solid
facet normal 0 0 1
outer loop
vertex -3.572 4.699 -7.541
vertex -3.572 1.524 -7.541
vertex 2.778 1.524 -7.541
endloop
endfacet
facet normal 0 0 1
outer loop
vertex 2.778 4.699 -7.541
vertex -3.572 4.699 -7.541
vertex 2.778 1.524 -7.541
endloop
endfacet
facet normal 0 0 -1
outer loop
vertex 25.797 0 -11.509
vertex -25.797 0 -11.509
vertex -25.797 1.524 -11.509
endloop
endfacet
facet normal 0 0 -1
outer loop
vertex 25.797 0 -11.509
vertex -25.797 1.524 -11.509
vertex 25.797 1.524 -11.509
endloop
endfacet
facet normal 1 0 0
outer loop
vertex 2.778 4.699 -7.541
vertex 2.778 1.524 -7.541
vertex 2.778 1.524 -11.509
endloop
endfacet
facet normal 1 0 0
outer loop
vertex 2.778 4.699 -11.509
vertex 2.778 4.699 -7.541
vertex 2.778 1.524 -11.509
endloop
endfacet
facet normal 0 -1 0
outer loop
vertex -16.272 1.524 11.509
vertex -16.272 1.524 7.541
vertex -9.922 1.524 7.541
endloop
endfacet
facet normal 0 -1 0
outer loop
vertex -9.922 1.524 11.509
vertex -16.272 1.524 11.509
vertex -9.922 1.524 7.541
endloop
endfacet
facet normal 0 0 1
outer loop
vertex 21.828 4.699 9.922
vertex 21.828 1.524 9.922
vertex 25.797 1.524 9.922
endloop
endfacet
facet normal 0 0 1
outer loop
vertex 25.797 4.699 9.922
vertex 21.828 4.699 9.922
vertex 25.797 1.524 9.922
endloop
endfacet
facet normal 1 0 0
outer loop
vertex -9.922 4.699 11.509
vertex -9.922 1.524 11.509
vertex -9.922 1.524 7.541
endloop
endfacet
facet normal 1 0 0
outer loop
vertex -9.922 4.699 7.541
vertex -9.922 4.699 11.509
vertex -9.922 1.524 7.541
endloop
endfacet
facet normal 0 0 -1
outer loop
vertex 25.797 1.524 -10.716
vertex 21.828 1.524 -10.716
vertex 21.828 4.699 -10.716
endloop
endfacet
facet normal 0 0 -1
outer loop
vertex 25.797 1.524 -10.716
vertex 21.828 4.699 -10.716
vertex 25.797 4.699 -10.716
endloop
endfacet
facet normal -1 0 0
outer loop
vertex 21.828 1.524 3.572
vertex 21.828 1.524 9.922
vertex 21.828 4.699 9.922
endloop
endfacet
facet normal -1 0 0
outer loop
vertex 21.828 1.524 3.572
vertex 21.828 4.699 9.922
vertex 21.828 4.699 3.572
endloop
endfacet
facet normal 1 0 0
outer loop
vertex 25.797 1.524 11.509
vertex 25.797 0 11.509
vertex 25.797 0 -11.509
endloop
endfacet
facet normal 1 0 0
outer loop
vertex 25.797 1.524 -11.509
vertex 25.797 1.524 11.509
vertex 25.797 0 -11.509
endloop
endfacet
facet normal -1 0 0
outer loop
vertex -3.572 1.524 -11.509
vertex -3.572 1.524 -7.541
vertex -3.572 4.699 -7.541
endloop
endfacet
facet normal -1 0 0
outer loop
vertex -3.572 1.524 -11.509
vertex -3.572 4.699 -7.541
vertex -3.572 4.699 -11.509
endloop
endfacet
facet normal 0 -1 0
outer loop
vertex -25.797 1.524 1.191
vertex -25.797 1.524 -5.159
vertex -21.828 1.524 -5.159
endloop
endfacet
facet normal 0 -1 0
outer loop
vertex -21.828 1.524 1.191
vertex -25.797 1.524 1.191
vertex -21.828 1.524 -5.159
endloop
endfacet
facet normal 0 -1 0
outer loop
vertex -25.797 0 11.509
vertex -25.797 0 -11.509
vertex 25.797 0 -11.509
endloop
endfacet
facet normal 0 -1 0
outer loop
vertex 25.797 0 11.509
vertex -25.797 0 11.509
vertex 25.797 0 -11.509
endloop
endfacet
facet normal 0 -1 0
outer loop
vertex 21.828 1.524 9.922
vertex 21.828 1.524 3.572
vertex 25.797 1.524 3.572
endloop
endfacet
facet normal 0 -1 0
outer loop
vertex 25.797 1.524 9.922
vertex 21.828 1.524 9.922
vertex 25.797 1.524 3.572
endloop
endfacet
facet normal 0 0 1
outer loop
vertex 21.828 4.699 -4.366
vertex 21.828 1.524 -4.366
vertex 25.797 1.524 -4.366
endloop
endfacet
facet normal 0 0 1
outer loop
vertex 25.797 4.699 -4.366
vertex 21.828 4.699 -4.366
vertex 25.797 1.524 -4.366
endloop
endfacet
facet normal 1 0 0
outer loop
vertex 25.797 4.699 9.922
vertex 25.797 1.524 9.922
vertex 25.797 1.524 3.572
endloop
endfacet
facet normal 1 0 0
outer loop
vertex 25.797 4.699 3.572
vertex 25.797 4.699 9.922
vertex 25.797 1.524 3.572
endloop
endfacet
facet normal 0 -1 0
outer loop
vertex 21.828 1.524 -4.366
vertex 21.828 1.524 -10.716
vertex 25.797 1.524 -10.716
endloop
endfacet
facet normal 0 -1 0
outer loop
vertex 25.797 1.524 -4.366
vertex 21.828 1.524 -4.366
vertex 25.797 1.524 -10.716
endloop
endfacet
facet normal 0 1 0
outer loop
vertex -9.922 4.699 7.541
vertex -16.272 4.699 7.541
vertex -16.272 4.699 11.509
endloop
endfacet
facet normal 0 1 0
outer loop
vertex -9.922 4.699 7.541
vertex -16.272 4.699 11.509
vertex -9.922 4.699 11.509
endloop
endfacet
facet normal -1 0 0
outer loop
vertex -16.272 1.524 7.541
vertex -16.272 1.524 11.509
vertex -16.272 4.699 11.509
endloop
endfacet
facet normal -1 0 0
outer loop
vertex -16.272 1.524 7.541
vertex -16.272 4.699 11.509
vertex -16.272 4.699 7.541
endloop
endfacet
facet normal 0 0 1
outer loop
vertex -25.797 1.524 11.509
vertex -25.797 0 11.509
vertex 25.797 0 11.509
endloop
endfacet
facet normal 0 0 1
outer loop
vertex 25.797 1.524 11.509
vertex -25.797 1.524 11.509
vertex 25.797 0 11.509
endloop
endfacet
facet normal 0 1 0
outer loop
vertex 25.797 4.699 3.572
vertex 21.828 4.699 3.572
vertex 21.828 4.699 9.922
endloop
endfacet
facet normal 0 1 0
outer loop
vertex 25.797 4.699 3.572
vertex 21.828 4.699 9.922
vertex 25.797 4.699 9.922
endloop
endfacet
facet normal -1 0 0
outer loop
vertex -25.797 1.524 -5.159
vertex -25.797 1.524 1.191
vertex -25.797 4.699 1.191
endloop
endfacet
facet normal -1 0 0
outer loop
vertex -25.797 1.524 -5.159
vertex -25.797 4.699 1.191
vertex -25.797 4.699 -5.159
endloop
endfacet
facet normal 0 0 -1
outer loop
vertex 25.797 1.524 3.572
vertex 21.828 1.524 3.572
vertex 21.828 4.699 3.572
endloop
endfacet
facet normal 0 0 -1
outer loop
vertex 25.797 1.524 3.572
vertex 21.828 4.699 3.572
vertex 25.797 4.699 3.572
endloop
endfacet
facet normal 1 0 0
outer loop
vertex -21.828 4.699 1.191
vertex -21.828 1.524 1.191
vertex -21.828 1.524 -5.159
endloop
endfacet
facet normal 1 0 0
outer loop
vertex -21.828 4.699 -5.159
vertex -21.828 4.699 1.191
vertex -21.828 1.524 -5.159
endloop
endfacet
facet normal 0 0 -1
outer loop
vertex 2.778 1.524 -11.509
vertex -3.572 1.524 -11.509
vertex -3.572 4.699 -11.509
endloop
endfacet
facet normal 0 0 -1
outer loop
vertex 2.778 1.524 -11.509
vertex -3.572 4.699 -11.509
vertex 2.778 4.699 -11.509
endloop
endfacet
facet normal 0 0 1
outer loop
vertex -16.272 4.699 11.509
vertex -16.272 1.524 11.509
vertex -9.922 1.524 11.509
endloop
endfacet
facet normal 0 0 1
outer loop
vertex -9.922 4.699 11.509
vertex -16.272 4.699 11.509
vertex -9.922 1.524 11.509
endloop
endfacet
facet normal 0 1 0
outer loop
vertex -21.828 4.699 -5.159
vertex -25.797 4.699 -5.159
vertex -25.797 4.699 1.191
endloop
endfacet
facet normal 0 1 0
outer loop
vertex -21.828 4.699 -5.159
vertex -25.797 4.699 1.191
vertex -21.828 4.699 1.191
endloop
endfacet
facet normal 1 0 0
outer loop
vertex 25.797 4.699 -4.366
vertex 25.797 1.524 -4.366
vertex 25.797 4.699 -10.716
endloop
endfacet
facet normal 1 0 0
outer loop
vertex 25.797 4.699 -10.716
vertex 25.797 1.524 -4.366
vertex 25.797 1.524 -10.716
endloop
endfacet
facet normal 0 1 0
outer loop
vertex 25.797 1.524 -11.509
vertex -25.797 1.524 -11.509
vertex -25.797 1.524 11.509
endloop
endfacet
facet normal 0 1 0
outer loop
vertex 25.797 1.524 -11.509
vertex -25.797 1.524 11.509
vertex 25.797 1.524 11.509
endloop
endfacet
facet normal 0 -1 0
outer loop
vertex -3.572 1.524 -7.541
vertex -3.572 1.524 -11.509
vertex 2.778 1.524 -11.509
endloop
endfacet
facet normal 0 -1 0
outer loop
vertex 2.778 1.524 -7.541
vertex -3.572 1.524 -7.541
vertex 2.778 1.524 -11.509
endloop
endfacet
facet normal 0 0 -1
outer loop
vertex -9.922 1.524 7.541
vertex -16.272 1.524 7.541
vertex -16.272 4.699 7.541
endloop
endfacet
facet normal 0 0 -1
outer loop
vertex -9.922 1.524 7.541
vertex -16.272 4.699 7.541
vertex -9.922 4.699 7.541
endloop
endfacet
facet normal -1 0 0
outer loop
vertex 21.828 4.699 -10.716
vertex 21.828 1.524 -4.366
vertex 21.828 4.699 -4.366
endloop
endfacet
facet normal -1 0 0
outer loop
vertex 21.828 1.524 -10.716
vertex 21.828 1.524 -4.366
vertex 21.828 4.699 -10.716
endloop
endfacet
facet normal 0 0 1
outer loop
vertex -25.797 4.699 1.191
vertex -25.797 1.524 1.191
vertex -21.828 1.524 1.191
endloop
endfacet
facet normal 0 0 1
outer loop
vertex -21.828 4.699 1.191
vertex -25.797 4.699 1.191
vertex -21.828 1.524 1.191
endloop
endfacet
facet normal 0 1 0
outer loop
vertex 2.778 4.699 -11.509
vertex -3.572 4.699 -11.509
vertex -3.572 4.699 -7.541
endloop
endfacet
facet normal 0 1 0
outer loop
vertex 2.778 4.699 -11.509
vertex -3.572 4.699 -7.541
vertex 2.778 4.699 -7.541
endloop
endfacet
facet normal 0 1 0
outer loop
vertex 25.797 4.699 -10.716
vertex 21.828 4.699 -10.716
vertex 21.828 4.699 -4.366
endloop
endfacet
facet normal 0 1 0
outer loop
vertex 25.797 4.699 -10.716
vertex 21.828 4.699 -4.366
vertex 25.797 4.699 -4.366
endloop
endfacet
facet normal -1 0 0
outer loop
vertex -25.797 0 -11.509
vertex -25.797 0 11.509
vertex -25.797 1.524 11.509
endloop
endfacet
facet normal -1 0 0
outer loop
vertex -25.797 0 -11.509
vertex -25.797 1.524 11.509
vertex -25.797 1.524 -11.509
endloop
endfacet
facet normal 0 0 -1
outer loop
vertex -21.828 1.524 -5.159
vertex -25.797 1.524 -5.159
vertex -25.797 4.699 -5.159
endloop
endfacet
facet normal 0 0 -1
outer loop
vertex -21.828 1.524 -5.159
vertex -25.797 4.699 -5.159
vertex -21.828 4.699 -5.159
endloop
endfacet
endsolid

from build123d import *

# Parameters (mm, degrees)
SKETCH1_W             = 51.59375
SKETCH1_H             = 23.01875
BOSS_EXTRUDE1_DEPTH   = 1.524
SKETCH2_W             = 3.96875
SKETCH2_H             = 6.35
BOSS_EXTRUDE2_DEPTH   = 3.175
BOSS_EXTRUDE2_2_DEPTH = 3.175
SKETCH2_W_2           = 6.35
SKETCH2_H_2           = 3.96875
BOSS_EXTRUDE2_3_DEPTH = 3.175
BOSS_EXTRUDE2_4_DEPTH = 3.175
BOSS_EXTRUDE2_5_DEPTH = 3.175


with BuildPart() as part:
    # Sketch1 → Boss-Extrude1 (new body)
    with BuildSketch(Plane(origin=(0, 0, 0), x_dir=(1, 0, 0), z_dir=(0, 1, 0))):
        Rectangle(SKETCH1_W, SKETCH1_H)
    extrude(amount=BOSS_EXTRUDE1_DEPTH)


with BuildPart() as body_2:
    # Sketch2 → Boss-Extrude2 (new body)
    with BuildSketch(Plane(origin=(0, 1.524, 0), x_dir=(1, 0, 0), z_dir=(0, 1, 0))):
        with Locations((23.8125, -6.746875)):
            Rectangle(SKETCH2_W, SKETCH2_H)
    extrude(amount=BOSS_EXTRUDE2_DEPTH)


with BuildPart() as body_3:
    # Sketch2 → Boss-Extrude2 2 (new body)
    with BuildSketch(Plane(origin=(0, 1.524, 0), x_dir=(1, 0, 0), z_dir=(0, 1, 0))):
        with Locations((23.8125, 7.540625)):
            Rectangle(SKETCH2_W, SKETCH2_H)
    extrude(amount=BOSS_EXTRUDE2_2_DEPTH)


with BuildPart() as body_4:
    # Sketch2 → Boss-Extrude2 3 (new body)
    with BuildSketch(Plane(origin=(0, 1.524, 0), x_dir=(1, 0, 0), z_dir=(0, 1, 0))):
        with Locations((-0.396875, 9.525)):
            Rectangle(SKETCH2_W_2, SKETCH2_H_2)
    extrude(amount=BOSS_EXTRUDE2_3_DEPTH)


with BuildPart() as body_5:
    # Sketch2 → Boss-Extrude2 4 (new body)
    with BuildSketch(Plane(origin=(0, 1.524, 0), x_dir=(1, 0, 0), z_dir=(0, 1, 0))):
        with Locations((-23.8125, 1.984375)):
            Rectangle(SKETCH2_W, SKETCH2_H)
    extrude(amount=BOSS_EXTRUDE2_4_DEPTH)


with BuildPart() as body_6:
    # Sketch2 → Boss-Extrude2 5 (new body)
    with BuildSketch(Plane(origin=(0, 1.524, 0), x_dir=(1, 0, 0), z_dir=(0, 1, 0))):
        with Locations((-13.096875, -9.525)):
            Rectangle(SKETCH2_W_2, SKETCH2_H_2)
    extrude(amount=BOSS_EXTRUDE2_5_DEPTH)


solid = Compound([part.part, body_2.part, body_3.part, body_4.part, body_5.part, body_6.part])
